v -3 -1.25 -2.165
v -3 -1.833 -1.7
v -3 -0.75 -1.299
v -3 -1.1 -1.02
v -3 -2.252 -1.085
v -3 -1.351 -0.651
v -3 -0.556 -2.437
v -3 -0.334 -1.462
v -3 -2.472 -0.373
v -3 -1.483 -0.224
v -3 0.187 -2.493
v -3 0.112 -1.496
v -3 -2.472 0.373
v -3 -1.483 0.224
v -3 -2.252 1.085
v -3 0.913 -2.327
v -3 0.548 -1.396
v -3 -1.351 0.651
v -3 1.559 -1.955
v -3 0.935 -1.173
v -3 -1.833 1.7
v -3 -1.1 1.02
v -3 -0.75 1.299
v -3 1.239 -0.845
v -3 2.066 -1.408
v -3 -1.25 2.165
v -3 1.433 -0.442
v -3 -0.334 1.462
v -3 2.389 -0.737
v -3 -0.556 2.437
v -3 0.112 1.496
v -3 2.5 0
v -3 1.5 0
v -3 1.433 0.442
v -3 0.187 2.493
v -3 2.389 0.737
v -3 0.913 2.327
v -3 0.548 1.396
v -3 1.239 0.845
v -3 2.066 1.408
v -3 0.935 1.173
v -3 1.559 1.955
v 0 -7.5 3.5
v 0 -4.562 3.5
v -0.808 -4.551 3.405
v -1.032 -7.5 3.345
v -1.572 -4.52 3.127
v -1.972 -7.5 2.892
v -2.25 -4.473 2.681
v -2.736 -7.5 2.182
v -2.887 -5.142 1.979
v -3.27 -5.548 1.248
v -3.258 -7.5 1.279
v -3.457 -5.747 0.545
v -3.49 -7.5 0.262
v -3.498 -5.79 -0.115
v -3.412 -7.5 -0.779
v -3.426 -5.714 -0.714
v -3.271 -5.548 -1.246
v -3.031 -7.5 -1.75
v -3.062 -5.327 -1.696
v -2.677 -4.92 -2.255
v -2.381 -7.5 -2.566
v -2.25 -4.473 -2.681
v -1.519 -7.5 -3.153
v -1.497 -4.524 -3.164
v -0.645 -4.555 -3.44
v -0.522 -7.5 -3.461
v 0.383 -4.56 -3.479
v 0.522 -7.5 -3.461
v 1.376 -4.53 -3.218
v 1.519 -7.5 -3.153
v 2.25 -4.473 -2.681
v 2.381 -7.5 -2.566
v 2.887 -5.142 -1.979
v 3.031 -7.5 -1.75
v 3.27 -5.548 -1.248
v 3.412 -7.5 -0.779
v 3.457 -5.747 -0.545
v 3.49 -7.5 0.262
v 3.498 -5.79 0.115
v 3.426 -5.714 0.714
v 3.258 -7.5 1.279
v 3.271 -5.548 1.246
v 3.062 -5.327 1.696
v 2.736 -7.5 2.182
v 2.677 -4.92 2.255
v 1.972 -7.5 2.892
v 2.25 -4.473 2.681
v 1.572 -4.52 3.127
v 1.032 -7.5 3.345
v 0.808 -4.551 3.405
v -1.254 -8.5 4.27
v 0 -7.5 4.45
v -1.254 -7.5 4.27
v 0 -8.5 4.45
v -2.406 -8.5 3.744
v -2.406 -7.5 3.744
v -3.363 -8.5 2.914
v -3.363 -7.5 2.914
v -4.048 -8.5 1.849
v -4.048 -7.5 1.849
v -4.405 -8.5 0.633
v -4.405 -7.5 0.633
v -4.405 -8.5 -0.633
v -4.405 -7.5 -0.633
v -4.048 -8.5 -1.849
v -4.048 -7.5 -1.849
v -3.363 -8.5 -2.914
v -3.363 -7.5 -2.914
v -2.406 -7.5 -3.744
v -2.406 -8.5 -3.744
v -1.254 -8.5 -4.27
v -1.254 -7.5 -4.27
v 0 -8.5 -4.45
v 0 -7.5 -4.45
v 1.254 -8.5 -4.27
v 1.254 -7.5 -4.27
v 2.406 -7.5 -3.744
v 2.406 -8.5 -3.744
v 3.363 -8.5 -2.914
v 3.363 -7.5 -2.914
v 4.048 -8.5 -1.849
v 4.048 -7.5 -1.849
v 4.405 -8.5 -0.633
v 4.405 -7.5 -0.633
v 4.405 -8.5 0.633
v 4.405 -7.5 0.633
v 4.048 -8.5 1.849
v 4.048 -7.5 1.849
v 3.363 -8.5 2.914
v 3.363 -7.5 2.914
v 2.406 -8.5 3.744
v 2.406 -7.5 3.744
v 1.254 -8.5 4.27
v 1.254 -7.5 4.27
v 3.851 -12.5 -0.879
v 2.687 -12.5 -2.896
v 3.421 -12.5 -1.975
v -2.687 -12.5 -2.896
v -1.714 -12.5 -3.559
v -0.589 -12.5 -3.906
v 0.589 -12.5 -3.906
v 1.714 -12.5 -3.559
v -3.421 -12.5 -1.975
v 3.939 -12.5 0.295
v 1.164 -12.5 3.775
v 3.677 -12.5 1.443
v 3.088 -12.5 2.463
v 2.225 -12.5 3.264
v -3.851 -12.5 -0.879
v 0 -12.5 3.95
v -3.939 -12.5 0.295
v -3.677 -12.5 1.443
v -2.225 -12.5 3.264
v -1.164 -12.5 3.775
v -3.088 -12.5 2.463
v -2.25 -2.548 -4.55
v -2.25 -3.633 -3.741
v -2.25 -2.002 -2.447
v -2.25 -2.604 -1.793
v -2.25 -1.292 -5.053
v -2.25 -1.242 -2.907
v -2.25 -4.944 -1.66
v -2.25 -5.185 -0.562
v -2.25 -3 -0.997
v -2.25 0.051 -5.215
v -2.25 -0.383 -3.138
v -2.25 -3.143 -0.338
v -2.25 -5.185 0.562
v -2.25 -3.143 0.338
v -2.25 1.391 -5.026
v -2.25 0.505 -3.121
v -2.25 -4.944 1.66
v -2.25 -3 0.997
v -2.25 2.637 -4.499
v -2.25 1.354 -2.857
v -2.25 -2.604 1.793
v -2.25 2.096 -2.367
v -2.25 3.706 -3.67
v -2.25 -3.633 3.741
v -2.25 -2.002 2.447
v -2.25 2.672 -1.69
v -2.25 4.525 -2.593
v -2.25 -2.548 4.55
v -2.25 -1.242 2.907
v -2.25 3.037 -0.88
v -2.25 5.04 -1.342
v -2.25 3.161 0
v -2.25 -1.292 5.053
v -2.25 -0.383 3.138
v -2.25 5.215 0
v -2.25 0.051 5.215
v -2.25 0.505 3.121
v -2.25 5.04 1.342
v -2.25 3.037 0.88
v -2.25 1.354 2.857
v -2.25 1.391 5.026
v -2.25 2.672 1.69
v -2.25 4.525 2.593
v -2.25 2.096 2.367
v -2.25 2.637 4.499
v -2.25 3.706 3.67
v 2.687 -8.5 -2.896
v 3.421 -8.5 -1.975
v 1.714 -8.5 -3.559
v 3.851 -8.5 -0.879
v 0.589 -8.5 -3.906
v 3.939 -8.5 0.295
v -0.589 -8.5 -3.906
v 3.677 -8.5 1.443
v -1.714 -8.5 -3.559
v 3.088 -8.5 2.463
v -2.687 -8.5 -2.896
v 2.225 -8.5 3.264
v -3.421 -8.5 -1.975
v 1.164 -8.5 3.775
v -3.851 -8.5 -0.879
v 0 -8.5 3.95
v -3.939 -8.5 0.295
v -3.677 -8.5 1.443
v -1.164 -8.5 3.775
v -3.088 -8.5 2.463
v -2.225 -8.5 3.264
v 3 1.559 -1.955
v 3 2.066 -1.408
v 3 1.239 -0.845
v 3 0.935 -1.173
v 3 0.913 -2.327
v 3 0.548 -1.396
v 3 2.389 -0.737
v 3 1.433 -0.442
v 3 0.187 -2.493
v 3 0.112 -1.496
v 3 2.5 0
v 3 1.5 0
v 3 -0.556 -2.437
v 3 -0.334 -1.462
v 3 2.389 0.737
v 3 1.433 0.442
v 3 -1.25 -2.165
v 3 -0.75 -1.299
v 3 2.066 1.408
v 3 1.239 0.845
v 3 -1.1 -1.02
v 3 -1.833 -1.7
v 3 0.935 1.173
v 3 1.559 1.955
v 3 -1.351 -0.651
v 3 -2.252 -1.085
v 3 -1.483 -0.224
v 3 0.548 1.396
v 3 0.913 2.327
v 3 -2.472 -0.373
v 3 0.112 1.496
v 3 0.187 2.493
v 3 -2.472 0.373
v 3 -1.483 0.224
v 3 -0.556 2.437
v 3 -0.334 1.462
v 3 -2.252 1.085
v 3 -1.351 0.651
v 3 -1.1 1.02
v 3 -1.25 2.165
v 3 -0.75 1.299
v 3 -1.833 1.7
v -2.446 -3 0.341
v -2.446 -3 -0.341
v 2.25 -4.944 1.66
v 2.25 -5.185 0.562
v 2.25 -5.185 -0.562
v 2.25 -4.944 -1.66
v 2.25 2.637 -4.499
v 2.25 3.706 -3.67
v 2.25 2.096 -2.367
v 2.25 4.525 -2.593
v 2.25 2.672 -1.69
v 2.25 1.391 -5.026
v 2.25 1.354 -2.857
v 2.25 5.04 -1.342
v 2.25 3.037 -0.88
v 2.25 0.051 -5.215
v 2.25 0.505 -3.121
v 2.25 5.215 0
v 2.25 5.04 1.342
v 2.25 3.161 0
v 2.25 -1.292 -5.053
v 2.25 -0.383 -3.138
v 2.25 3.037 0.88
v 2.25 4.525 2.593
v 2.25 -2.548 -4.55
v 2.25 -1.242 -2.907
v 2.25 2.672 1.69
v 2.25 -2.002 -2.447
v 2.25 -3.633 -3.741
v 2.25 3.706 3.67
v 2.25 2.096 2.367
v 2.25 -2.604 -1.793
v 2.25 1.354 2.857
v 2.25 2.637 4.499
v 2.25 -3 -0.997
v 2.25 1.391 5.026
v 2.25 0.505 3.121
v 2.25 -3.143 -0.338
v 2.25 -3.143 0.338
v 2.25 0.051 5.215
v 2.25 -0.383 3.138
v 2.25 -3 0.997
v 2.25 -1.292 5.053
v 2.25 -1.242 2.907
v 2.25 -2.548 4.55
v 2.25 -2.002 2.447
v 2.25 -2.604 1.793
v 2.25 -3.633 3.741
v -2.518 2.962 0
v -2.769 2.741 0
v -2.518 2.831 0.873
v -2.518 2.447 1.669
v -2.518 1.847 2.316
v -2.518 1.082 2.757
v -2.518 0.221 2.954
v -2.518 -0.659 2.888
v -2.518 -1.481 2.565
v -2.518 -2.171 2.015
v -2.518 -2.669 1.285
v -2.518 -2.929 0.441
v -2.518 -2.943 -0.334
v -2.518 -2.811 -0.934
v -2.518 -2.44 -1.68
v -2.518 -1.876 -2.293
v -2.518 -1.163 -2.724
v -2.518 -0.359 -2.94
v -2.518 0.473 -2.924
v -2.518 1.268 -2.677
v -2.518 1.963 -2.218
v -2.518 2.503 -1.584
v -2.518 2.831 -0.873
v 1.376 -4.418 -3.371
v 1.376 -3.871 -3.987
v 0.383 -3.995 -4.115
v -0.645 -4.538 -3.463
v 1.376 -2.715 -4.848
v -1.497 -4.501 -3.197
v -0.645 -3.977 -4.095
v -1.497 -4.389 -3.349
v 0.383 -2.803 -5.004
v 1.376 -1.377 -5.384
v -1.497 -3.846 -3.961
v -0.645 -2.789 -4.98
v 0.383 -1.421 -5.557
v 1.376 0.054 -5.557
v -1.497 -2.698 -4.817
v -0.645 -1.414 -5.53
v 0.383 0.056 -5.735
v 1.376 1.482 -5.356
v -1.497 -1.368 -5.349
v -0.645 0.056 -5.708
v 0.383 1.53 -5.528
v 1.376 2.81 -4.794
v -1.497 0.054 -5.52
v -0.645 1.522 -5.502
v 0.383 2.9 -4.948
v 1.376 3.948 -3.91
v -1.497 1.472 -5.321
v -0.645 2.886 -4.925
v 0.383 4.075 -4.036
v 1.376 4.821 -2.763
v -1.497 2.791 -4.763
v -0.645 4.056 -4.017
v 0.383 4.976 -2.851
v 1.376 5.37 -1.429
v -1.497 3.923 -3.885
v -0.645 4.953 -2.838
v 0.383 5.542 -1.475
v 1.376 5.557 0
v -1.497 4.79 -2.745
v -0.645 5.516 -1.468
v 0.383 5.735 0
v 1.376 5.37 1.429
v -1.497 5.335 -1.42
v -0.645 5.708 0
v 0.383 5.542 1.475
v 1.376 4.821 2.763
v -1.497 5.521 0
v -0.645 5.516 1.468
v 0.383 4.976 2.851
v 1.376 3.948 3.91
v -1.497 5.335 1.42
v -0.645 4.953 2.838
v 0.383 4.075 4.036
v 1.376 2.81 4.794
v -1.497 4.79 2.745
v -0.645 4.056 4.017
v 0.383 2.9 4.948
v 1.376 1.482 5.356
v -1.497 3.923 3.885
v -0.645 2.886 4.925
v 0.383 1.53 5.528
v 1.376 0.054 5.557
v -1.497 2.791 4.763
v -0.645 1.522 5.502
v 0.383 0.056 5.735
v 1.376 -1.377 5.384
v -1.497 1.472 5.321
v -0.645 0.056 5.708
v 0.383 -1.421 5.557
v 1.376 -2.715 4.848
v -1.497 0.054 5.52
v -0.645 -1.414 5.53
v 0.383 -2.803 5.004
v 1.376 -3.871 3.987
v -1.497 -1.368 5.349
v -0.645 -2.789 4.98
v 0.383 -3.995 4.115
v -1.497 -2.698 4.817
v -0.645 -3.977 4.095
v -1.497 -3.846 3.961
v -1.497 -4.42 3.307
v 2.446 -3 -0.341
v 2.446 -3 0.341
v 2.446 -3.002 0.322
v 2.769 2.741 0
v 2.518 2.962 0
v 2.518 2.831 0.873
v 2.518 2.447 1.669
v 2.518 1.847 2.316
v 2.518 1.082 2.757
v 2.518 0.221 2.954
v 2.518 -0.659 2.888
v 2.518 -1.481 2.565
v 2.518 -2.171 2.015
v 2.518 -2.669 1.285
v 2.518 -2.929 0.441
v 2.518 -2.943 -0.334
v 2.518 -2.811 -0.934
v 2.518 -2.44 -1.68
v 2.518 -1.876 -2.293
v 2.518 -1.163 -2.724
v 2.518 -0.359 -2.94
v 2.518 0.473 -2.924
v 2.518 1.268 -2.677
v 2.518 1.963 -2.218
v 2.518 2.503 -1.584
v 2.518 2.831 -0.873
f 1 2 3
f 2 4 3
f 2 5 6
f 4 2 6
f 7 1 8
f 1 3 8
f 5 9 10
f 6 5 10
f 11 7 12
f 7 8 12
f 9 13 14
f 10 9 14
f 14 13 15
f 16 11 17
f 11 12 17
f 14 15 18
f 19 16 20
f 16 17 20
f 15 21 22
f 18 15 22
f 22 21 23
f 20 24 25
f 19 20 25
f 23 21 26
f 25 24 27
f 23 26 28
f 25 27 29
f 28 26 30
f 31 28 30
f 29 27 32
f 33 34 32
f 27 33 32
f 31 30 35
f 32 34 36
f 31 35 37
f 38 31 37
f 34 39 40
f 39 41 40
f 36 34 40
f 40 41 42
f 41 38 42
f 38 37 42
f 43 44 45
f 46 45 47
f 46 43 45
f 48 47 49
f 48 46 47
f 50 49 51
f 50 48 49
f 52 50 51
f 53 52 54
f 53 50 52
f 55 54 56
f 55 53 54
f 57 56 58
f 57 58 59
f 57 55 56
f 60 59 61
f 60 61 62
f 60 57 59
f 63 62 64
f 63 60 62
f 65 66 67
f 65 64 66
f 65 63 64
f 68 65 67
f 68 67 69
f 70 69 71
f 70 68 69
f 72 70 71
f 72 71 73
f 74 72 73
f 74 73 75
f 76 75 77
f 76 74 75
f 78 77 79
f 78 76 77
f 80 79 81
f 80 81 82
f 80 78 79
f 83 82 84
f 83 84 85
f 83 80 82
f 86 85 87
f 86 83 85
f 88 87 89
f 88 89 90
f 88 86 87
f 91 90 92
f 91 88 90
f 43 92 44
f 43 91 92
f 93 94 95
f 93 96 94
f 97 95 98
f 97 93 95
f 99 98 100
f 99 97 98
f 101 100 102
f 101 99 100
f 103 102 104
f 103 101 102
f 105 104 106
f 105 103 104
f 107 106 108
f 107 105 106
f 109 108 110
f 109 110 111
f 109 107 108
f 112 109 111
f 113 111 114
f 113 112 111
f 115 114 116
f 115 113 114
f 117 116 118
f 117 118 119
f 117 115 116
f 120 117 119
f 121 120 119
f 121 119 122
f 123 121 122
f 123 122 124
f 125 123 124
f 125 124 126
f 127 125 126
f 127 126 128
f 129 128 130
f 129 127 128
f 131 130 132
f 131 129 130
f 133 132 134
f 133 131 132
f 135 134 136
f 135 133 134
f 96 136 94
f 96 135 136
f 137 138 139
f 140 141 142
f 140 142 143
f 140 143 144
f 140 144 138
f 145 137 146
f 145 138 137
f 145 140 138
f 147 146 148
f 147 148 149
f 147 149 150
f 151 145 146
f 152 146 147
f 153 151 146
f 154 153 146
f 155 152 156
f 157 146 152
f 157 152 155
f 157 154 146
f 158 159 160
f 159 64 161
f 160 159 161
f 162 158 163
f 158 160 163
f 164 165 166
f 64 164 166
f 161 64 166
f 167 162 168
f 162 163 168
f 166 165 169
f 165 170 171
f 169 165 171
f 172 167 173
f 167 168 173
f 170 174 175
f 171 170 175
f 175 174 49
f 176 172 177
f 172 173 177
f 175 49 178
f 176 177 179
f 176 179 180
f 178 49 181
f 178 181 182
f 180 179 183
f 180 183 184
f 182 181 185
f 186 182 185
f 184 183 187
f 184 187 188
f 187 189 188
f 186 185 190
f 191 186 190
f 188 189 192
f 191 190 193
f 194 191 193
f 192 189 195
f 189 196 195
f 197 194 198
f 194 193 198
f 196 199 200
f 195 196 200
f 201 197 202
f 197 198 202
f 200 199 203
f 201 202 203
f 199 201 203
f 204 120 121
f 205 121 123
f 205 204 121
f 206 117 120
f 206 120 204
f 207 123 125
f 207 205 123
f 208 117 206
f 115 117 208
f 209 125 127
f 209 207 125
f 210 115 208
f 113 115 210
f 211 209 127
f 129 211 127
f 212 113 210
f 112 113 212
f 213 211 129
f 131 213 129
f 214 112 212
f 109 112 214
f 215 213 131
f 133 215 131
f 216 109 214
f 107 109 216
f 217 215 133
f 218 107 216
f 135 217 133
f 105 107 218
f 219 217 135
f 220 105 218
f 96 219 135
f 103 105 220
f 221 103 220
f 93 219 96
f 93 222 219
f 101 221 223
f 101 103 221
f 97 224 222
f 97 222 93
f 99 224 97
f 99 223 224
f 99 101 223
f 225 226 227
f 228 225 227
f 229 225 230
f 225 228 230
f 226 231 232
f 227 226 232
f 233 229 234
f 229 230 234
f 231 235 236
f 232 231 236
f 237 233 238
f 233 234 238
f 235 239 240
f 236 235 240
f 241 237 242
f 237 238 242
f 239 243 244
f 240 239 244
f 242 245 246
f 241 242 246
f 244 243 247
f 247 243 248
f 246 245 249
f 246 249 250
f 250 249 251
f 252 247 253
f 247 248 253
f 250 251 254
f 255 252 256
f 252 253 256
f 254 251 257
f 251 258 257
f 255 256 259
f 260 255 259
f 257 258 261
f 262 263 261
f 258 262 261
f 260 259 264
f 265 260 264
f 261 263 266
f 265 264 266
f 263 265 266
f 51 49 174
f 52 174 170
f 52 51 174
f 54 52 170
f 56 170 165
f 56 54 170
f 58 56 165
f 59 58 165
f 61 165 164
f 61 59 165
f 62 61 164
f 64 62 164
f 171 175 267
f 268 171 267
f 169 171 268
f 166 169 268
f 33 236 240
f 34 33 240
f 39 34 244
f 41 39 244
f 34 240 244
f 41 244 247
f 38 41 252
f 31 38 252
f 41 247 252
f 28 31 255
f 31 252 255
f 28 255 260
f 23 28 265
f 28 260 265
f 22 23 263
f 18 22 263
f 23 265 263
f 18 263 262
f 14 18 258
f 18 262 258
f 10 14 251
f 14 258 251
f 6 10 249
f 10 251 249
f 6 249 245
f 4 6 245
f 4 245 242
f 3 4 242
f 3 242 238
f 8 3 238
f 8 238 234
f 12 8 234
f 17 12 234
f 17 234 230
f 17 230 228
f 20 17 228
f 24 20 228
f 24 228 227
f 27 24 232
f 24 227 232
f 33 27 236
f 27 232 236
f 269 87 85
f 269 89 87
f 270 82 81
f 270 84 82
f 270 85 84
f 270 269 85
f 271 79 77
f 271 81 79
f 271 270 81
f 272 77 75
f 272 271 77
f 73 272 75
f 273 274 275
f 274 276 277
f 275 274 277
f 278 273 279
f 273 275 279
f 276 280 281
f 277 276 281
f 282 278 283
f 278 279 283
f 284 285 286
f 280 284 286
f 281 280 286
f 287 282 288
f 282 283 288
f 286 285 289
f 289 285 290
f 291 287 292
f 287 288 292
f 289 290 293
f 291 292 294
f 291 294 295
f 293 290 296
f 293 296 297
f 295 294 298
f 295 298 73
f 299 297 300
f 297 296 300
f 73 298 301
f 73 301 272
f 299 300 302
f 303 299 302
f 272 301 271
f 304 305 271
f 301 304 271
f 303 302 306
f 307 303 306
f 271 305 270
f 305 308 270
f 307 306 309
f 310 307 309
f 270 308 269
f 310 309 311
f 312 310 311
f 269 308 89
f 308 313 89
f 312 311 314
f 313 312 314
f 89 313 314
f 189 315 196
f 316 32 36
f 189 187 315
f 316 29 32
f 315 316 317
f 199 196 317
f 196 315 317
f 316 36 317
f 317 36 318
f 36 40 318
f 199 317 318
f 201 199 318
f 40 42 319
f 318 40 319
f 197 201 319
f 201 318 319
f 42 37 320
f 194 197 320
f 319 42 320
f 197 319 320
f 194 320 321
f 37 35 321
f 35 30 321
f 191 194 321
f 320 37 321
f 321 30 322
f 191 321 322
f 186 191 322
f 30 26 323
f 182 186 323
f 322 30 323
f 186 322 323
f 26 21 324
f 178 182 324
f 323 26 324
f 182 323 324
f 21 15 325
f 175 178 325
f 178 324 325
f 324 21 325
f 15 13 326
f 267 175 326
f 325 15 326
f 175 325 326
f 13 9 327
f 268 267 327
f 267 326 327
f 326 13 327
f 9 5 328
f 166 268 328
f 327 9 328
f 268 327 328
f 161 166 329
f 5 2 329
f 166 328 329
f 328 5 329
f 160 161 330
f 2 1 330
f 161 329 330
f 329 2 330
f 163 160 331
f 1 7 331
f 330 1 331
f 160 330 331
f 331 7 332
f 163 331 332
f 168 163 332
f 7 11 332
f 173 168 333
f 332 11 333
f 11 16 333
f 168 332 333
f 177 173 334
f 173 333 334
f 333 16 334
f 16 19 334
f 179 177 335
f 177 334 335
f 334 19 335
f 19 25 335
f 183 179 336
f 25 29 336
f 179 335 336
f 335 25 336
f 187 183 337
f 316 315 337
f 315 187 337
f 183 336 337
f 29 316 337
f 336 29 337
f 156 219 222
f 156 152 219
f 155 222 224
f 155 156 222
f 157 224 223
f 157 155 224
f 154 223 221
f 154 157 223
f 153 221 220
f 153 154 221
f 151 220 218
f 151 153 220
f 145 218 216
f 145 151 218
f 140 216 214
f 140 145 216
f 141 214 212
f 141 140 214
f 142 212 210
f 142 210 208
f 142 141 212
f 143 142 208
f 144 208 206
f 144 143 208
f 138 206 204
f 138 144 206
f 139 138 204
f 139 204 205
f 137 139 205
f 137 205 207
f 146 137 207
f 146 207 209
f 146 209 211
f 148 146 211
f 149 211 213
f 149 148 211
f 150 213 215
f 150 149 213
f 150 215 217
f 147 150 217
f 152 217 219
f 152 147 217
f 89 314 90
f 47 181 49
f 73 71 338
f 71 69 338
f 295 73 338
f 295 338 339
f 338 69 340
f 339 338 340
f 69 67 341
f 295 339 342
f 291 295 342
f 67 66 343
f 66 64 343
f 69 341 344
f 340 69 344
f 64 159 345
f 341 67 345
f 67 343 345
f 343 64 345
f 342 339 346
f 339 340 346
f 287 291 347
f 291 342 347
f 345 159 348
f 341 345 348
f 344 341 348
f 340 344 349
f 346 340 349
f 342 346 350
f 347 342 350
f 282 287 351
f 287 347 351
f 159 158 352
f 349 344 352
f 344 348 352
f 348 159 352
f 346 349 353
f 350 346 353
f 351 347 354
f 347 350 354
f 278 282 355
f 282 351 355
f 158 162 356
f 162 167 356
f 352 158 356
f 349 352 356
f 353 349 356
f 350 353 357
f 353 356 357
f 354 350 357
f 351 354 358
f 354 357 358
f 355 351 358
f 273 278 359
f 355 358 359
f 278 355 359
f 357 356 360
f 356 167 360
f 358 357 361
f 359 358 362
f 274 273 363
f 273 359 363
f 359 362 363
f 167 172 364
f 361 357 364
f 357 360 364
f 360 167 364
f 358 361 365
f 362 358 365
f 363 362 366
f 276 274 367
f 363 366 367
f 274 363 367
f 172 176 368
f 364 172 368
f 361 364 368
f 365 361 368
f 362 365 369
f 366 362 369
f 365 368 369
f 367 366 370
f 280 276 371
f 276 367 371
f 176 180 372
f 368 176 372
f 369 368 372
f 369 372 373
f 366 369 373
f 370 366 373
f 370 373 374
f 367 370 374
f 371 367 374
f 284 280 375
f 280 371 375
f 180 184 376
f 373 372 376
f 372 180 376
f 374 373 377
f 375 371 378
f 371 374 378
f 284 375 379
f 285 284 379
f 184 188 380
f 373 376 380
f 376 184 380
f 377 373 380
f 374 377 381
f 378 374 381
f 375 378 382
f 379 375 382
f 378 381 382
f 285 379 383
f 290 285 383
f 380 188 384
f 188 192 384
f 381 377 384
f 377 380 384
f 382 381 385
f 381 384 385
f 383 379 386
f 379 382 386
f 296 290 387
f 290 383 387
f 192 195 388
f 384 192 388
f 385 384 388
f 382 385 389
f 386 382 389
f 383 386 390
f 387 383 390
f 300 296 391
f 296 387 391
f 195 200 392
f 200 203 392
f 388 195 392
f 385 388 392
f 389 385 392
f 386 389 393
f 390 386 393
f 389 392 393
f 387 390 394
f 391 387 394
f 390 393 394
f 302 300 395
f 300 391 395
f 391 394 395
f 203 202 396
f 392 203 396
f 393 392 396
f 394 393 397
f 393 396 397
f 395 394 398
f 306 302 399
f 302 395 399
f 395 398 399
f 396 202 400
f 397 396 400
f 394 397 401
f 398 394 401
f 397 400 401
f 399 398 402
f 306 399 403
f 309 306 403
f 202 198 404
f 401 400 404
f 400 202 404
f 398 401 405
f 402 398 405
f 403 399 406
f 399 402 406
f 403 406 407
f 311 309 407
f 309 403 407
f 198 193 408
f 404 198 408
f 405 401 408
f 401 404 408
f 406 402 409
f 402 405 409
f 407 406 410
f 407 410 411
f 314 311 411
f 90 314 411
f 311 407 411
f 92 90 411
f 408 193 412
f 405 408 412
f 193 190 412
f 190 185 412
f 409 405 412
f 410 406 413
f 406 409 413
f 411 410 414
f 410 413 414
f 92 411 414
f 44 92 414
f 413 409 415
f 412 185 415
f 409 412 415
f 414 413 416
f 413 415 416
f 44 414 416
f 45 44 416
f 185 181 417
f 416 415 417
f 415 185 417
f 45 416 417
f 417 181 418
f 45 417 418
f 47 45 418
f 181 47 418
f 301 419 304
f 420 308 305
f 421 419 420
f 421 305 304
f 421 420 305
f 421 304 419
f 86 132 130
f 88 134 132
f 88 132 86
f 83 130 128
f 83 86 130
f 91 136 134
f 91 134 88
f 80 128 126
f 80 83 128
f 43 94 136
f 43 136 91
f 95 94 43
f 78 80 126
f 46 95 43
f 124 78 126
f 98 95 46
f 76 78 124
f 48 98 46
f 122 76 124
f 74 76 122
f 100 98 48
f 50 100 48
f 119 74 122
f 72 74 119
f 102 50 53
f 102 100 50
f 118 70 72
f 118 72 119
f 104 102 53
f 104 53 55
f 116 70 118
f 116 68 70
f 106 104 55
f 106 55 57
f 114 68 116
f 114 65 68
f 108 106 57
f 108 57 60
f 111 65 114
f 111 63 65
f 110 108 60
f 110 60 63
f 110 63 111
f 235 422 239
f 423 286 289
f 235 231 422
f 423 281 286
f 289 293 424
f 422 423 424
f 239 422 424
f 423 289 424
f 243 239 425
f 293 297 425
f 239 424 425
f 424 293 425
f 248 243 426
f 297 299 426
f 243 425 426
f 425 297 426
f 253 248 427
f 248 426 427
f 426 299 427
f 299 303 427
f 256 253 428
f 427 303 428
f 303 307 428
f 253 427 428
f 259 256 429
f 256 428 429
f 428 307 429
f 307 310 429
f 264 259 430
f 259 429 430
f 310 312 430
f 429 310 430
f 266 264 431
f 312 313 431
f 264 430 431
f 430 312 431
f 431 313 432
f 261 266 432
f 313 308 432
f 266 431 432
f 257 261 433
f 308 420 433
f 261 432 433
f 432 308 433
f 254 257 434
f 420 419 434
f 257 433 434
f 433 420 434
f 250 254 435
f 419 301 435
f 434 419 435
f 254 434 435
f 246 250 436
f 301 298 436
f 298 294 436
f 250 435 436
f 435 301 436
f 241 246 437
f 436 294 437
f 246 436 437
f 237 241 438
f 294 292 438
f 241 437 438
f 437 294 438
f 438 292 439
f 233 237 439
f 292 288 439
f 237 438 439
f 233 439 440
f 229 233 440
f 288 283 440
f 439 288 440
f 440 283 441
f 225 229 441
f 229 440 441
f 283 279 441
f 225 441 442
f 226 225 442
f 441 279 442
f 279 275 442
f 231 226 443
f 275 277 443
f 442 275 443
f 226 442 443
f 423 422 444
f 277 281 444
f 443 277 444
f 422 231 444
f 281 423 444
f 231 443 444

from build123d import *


with BuildPart() as f1:
    # F0 (on Top) → F1 (revolve)
    with BuildSketch(Plane.XY):
        with BuildLine():
            Line((-3, 2.5), (-3, 1.5))
            Line((-3, 1.5), (3, 1.5))
            Line((3, 1.5), (3, 2.5))
            ThreePointArc((3, 2.5), (2.645751, 2.854249), (2.25, 3.161438))
            ThreePointArc((2.25, 3.161438), (0, 3.854249), (-2.25, 3.161438))
            ThreePointArc((-2.25, 3.161438), (-2.645751, 2.854249), (-3, 2.5))
        make_face()
        with BuildLine():
            Line((-2.25, 5.215143), (-2.25, 3.161438))
            ThreePointArc((-2.25, 3.161438), (0, 3.854249), (2.25, 3.161438))
            Line((2.25, 3.161438), (2.25, 5.215143))
            ThreePointArc((2.25, 5.215143), (0, 5.75), (-2.25, 5.215143))
        make_face()
    revolve(axis=Axis((0, 0, 0), (1, 0, 0)))

    # F2 (on Right) → F3 (revolve)
    with BuildSketch(Plane.YZ):
        Polygon((-12.5, 3.95), (-12.5, 0), (-3, 0), (-3, 3.5), (-7.5, 3.5), (-7.5, 4.45), (-8.5, 4.45), (-8.5, 3.95), align=None)
    revolve(axis=Axis((0, -6.25, 0), (0, -1, 0)))

    # F0 (on Top) → F4 (revolve, cut)
    with BuildSketch(Plane.XY):
        with BuildLine():
            Line((3, 2.5), (3, 1.5))
            Line((3, 1.5), (5, 1.5))
            Line((5, 1.5), (5, 6))
            Line((5, 6), (3.95, 6))
            Line((3.95, 6), (2.25, 5.215143))
            Line((2.25, 5.215143), (2.25, 3.161438))
            ThreePointArc((2.25, 3.161438), (2.645751, 2.854249), (3, 2.5))
        make_face()
        with BuildLine():
            Line((-5, 1.5), (-3, 1.5))
            Line((-3, 1.5), (-3, 2.5))
            ThreePointArc((-3, 2.5), (-2.645751, 2.854249), (-2.25, 3.161438))
            Line((-2.25, 3.161438), (-2.25, 5.215143))
            Line((-2.25, 5.215143), (-3.95, 6))
            Line((-3.95, 6), (-5, 6))
            Line((-5, 6), (-5, 1.5))
        make_face()
    revolve(axis=Axis((0, 0, 0), (1, 0, 0)), mode=Mode.SUBTRACT)


solid = f1.part
